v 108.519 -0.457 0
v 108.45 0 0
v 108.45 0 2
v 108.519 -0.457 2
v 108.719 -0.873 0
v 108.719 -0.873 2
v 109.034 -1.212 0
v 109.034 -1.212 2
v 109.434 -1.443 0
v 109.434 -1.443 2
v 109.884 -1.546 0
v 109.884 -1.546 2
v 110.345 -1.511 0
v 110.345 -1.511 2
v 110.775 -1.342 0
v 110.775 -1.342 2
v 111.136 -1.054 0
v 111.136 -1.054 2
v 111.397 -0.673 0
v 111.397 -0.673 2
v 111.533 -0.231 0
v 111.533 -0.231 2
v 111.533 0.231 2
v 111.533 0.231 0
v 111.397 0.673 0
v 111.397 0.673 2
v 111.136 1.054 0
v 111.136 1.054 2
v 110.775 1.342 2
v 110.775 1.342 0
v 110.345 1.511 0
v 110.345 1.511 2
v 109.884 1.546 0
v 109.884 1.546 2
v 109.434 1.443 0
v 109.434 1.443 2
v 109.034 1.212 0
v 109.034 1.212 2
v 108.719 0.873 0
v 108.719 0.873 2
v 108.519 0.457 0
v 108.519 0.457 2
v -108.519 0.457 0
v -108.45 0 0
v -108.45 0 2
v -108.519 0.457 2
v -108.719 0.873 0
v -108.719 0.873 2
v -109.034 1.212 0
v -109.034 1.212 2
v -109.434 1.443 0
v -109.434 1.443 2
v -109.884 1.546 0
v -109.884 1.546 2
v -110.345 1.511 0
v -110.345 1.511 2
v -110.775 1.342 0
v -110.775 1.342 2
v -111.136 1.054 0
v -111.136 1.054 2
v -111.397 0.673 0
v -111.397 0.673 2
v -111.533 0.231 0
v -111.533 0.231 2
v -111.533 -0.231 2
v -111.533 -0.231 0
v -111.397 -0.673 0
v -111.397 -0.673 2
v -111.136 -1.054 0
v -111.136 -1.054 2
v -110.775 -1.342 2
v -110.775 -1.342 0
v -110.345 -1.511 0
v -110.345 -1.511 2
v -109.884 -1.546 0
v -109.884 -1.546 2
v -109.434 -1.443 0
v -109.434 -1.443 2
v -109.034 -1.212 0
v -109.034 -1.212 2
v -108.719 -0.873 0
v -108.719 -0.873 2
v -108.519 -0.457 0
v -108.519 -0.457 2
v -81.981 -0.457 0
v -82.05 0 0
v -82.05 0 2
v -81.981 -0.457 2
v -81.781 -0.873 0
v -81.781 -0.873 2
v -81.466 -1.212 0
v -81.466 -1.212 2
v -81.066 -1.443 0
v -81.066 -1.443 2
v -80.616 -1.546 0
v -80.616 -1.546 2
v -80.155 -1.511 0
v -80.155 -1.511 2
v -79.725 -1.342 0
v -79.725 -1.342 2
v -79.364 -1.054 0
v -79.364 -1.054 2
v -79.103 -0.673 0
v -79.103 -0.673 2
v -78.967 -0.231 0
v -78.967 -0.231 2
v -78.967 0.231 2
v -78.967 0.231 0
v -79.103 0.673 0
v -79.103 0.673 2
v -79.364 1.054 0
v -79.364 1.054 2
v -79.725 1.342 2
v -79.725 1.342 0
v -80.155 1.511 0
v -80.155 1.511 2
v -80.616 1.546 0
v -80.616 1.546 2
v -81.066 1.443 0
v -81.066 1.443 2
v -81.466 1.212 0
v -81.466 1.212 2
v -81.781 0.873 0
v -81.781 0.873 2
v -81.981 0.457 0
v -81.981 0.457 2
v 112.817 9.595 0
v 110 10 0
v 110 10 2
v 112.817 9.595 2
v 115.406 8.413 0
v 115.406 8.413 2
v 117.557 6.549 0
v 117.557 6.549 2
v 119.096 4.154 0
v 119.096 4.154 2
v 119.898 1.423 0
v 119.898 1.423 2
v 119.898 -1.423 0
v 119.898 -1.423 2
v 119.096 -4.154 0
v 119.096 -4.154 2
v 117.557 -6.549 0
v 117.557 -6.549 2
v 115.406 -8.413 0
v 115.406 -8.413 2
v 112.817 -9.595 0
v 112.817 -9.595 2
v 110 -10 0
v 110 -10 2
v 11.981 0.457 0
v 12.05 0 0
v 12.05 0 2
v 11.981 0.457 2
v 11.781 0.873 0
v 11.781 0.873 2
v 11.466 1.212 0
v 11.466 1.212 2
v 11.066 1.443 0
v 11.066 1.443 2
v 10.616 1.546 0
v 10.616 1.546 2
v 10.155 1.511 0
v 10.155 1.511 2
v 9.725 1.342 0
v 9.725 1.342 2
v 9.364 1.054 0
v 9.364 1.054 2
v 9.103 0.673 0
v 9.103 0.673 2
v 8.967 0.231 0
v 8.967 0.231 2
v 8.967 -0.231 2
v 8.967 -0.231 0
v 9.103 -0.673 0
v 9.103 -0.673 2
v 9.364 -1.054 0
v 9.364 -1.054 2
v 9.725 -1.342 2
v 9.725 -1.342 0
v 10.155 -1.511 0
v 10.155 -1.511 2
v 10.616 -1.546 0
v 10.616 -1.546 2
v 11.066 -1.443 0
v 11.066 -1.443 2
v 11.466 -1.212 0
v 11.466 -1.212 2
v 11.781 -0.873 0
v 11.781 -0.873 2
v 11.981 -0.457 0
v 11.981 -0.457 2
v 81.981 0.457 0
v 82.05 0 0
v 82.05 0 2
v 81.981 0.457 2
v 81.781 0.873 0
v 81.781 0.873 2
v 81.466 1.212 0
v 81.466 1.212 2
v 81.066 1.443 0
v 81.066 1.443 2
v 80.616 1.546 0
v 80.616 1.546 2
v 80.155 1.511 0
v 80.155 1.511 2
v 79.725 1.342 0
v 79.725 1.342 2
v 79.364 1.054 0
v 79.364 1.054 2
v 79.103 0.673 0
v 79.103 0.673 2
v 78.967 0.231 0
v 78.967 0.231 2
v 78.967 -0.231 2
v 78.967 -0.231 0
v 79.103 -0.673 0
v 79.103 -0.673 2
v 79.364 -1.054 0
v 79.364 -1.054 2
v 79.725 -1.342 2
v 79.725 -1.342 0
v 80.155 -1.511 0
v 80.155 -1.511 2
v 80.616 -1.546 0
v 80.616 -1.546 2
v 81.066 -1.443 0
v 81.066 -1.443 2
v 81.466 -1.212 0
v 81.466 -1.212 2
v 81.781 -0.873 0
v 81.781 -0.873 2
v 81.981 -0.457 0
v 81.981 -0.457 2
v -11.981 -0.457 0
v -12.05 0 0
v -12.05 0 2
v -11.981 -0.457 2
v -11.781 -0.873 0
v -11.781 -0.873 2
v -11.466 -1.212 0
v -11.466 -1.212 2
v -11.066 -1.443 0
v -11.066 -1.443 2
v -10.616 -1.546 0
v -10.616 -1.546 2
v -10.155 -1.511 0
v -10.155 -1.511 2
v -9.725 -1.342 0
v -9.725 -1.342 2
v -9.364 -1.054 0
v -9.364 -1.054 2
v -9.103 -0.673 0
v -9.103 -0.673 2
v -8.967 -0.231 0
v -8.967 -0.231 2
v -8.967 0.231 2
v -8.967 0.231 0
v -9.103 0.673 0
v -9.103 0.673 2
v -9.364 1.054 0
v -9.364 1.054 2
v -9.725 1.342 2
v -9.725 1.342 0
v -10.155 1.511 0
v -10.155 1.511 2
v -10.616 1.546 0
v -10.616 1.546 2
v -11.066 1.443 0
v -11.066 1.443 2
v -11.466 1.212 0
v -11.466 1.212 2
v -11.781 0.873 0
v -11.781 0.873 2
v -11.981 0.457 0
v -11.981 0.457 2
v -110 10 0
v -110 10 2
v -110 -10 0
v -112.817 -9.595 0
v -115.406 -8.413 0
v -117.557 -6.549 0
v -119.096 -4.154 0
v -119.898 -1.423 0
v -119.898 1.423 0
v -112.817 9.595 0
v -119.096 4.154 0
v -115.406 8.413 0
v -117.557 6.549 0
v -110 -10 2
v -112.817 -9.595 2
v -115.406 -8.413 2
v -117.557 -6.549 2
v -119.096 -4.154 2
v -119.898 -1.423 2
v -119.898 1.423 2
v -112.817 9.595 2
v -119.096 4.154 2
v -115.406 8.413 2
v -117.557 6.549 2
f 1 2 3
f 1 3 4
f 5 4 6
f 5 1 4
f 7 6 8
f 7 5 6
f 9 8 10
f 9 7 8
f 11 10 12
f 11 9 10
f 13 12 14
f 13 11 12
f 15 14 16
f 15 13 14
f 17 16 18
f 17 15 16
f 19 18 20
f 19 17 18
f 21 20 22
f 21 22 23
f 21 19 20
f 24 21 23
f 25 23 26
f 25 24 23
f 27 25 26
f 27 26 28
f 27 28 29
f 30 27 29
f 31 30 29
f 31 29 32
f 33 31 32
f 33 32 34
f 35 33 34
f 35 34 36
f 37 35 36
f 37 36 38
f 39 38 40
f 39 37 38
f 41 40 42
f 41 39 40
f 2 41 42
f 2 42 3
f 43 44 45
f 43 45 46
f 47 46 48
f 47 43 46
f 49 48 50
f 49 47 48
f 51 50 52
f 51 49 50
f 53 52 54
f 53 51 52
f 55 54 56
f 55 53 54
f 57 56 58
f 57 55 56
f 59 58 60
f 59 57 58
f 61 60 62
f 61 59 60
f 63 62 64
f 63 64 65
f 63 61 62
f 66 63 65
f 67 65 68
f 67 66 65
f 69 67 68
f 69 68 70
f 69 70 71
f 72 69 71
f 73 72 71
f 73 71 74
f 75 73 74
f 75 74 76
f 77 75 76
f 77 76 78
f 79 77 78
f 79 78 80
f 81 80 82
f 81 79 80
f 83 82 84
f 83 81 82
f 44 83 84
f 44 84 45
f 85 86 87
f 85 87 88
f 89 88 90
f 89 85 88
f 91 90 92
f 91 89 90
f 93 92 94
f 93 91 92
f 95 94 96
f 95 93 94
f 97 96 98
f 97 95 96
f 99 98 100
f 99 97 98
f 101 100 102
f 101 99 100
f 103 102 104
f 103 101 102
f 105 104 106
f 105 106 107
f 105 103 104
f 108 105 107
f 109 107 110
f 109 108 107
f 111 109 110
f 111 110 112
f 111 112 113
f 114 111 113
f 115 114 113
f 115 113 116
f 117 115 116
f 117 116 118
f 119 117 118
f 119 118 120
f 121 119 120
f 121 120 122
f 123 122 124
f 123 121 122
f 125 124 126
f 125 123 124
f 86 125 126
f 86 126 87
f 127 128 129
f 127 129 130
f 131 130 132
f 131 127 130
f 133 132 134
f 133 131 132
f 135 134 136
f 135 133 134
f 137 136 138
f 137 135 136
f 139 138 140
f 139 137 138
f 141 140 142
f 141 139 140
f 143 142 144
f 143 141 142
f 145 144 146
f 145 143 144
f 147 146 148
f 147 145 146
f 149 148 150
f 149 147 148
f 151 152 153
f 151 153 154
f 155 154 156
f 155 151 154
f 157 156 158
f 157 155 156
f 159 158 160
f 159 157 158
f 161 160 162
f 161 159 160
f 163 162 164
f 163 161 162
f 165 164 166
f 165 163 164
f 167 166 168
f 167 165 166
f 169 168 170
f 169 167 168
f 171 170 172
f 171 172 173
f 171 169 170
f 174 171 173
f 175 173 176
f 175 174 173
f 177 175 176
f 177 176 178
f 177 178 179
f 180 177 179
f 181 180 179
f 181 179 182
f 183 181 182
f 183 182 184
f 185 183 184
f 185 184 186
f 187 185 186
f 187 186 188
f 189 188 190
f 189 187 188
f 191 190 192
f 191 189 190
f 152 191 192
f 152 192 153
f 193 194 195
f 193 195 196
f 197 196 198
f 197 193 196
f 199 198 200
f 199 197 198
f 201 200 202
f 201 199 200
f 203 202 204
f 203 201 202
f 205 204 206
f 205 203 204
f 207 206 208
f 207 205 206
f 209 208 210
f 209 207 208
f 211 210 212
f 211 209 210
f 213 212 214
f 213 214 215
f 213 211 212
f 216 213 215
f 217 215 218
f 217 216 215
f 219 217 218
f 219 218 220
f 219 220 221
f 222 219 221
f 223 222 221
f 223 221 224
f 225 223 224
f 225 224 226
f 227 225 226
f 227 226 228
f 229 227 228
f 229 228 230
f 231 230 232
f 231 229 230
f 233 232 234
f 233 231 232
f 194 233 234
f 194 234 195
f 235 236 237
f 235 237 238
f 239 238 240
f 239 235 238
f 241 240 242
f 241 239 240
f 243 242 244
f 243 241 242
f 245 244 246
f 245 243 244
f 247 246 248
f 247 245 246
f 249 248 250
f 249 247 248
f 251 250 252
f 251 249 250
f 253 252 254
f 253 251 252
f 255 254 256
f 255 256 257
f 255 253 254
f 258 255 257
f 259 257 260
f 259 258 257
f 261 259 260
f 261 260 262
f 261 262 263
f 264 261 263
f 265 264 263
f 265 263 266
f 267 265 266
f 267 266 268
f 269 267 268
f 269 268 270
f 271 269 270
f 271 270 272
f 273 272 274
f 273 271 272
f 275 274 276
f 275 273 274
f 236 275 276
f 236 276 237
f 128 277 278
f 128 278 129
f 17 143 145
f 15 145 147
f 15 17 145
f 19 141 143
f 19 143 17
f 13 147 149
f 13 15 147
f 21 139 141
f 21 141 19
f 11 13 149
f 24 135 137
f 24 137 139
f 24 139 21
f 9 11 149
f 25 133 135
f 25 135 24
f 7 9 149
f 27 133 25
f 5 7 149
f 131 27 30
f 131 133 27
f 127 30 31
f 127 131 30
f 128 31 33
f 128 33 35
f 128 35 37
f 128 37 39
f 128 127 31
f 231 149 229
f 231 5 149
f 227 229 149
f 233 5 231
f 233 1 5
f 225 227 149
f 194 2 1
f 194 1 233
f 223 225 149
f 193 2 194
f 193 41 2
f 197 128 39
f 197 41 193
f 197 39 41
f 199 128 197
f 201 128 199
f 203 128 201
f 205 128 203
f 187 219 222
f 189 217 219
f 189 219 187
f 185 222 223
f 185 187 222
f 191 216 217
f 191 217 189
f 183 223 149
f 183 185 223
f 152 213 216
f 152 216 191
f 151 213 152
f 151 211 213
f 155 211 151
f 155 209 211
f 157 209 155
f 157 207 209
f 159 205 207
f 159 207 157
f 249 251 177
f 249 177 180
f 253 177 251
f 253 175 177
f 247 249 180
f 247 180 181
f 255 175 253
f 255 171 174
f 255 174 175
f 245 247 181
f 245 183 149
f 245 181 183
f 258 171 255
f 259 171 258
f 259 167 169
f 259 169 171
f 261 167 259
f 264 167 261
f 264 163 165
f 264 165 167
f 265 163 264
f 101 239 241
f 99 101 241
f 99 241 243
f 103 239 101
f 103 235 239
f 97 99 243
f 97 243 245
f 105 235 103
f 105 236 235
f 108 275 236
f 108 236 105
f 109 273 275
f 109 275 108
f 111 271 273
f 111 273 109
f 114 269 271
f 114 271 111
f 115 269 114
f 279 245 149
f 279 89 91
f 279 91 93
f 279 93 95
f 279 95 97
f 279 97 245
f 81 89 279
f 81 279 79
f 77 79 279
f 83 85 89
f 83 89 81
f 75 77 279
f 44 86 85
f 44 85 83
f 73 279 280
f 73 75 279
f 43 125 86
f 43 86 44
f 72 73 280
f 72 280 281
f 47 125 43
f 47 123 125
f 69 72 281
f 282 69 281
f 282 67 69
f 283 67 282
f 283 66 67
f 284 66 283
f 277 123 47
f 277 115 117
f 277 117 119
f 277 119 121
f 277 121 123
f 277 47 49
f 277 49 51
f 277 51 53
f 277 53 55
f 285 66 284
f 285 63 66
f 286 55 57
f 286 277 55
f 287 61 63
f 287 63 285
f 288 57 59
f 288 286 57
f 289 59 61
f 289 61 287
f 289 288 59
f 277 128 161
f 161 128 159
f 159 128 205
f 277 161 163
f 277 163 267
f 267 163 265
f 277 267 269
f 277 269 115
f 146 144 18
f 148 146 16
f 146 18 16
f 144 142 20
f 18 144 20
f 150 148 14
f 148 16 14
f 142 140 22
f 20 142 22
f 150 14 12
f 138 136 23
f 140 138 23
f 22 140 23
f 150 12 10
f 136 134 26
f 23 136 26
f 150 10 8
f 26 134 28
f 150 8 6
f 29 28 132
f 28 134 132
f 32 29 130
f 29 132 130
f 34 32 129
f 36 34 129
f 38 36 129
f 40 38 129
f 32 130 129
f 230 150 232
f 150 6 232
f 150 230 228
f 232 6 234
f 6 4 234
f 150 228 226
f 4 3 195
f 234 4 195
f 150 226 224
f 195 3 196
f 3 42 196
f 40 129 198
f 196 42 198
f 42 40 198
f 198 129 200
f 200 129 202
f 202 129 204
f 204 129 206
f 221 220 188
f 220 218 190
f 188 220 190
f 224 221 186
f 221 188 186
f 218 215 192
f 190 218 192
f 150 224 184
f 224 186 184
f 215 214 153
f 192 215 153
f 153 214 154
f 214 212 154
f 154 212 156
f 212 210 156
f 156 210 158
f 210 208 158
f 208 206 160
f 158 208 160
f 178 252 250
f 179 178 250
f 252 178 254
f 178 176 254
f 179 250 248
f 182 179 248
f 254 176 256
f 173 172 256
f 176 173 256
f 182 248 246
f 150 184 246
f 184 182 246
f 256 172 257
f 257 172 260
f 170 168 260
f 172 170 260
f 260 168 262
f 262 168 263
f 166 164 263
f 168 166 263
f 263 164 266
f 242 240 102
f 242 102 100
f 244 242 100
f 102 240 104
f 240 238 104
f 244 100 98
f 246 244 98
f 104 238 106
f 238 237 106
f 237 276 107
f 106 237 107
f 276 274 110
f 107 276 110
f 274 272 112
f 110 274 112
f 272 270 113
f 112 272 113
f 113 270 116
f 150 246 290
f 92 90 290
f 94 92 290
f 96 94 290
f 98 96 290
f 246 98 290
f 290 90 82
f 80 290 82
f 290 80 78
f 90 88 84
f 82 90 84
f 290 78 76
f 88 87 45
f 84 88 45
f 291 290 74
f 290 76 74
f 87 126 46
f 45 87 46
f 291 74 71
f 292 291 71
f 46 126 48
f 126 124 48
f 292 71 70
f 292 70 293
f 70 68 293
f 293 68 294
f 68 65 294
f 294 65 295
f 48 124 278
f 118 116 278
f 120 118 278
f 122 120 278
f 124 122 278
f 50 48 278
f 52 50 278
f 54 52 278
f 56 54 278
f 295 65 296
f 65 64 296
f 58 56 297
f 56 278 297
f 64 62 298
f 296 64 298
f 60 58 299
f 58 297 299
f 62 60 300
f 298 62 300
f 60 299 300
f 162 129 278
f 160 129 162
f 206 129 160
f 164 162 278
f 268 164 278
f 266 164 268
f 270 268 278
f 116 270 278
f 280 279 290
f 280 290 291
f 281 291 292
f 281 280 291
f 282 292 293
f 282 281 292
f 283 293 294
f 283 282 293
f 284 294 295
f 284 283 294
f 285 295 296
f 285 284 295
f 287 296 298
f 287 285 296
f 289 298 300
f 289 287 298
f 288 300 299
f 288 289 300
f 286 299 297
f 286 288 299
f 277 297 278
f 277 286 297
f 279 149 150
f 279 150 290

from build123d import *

# Parameters (mm, degrees)
SKETCH_1_R      = 1.55
EXTRUDE_1_DEPTH = 2


with BuildPart() as part:
    # 草图1 → 凸台-拉伸1 (new body)
    with BuildSketch(Plane.XY):
        with BuildLine():
            Line((-110, 10), (110, 10))
            ThreePointArc((110, 10), (120, 0), (110, -10))
            Line((110, -10), (-110, -10))
            ThreePointArc((-110, -10), (-120, 0), (-110, 10))
        make_face()
        with Locations((10.5, 0)):
            Circle(SKETCH_1_R, mode=Mode.SUBTRACT)
        with Locations((80.5, 0)):
            Circle(SKETCH_1_R, mode=Mode.SUBTRACT)
        with Locations(Location((-80.5, 0, 0), (0, 0, 180))):
            Circle(SKETCH_1_R, mode=Mode.SUBTRACT)
        with Locations(Location((-10.5, 0, 0), (0, 0, 180))):
            Circle(SKETCH_1_R, mode=Mode.SUBTRACT)
        with Locations((-110, 0)):
            Circle(SKETCH_1_R, mode=Mode.SUBTRACT)
        with Locations(Location((110, 0, 0), (0, 0, 180))):
            Circle(SKETCH_1_R, mode=Mode.SUBTRACT)
    extrude(amount=EXTRUDE_1_DEPTH)


solid = part.part
